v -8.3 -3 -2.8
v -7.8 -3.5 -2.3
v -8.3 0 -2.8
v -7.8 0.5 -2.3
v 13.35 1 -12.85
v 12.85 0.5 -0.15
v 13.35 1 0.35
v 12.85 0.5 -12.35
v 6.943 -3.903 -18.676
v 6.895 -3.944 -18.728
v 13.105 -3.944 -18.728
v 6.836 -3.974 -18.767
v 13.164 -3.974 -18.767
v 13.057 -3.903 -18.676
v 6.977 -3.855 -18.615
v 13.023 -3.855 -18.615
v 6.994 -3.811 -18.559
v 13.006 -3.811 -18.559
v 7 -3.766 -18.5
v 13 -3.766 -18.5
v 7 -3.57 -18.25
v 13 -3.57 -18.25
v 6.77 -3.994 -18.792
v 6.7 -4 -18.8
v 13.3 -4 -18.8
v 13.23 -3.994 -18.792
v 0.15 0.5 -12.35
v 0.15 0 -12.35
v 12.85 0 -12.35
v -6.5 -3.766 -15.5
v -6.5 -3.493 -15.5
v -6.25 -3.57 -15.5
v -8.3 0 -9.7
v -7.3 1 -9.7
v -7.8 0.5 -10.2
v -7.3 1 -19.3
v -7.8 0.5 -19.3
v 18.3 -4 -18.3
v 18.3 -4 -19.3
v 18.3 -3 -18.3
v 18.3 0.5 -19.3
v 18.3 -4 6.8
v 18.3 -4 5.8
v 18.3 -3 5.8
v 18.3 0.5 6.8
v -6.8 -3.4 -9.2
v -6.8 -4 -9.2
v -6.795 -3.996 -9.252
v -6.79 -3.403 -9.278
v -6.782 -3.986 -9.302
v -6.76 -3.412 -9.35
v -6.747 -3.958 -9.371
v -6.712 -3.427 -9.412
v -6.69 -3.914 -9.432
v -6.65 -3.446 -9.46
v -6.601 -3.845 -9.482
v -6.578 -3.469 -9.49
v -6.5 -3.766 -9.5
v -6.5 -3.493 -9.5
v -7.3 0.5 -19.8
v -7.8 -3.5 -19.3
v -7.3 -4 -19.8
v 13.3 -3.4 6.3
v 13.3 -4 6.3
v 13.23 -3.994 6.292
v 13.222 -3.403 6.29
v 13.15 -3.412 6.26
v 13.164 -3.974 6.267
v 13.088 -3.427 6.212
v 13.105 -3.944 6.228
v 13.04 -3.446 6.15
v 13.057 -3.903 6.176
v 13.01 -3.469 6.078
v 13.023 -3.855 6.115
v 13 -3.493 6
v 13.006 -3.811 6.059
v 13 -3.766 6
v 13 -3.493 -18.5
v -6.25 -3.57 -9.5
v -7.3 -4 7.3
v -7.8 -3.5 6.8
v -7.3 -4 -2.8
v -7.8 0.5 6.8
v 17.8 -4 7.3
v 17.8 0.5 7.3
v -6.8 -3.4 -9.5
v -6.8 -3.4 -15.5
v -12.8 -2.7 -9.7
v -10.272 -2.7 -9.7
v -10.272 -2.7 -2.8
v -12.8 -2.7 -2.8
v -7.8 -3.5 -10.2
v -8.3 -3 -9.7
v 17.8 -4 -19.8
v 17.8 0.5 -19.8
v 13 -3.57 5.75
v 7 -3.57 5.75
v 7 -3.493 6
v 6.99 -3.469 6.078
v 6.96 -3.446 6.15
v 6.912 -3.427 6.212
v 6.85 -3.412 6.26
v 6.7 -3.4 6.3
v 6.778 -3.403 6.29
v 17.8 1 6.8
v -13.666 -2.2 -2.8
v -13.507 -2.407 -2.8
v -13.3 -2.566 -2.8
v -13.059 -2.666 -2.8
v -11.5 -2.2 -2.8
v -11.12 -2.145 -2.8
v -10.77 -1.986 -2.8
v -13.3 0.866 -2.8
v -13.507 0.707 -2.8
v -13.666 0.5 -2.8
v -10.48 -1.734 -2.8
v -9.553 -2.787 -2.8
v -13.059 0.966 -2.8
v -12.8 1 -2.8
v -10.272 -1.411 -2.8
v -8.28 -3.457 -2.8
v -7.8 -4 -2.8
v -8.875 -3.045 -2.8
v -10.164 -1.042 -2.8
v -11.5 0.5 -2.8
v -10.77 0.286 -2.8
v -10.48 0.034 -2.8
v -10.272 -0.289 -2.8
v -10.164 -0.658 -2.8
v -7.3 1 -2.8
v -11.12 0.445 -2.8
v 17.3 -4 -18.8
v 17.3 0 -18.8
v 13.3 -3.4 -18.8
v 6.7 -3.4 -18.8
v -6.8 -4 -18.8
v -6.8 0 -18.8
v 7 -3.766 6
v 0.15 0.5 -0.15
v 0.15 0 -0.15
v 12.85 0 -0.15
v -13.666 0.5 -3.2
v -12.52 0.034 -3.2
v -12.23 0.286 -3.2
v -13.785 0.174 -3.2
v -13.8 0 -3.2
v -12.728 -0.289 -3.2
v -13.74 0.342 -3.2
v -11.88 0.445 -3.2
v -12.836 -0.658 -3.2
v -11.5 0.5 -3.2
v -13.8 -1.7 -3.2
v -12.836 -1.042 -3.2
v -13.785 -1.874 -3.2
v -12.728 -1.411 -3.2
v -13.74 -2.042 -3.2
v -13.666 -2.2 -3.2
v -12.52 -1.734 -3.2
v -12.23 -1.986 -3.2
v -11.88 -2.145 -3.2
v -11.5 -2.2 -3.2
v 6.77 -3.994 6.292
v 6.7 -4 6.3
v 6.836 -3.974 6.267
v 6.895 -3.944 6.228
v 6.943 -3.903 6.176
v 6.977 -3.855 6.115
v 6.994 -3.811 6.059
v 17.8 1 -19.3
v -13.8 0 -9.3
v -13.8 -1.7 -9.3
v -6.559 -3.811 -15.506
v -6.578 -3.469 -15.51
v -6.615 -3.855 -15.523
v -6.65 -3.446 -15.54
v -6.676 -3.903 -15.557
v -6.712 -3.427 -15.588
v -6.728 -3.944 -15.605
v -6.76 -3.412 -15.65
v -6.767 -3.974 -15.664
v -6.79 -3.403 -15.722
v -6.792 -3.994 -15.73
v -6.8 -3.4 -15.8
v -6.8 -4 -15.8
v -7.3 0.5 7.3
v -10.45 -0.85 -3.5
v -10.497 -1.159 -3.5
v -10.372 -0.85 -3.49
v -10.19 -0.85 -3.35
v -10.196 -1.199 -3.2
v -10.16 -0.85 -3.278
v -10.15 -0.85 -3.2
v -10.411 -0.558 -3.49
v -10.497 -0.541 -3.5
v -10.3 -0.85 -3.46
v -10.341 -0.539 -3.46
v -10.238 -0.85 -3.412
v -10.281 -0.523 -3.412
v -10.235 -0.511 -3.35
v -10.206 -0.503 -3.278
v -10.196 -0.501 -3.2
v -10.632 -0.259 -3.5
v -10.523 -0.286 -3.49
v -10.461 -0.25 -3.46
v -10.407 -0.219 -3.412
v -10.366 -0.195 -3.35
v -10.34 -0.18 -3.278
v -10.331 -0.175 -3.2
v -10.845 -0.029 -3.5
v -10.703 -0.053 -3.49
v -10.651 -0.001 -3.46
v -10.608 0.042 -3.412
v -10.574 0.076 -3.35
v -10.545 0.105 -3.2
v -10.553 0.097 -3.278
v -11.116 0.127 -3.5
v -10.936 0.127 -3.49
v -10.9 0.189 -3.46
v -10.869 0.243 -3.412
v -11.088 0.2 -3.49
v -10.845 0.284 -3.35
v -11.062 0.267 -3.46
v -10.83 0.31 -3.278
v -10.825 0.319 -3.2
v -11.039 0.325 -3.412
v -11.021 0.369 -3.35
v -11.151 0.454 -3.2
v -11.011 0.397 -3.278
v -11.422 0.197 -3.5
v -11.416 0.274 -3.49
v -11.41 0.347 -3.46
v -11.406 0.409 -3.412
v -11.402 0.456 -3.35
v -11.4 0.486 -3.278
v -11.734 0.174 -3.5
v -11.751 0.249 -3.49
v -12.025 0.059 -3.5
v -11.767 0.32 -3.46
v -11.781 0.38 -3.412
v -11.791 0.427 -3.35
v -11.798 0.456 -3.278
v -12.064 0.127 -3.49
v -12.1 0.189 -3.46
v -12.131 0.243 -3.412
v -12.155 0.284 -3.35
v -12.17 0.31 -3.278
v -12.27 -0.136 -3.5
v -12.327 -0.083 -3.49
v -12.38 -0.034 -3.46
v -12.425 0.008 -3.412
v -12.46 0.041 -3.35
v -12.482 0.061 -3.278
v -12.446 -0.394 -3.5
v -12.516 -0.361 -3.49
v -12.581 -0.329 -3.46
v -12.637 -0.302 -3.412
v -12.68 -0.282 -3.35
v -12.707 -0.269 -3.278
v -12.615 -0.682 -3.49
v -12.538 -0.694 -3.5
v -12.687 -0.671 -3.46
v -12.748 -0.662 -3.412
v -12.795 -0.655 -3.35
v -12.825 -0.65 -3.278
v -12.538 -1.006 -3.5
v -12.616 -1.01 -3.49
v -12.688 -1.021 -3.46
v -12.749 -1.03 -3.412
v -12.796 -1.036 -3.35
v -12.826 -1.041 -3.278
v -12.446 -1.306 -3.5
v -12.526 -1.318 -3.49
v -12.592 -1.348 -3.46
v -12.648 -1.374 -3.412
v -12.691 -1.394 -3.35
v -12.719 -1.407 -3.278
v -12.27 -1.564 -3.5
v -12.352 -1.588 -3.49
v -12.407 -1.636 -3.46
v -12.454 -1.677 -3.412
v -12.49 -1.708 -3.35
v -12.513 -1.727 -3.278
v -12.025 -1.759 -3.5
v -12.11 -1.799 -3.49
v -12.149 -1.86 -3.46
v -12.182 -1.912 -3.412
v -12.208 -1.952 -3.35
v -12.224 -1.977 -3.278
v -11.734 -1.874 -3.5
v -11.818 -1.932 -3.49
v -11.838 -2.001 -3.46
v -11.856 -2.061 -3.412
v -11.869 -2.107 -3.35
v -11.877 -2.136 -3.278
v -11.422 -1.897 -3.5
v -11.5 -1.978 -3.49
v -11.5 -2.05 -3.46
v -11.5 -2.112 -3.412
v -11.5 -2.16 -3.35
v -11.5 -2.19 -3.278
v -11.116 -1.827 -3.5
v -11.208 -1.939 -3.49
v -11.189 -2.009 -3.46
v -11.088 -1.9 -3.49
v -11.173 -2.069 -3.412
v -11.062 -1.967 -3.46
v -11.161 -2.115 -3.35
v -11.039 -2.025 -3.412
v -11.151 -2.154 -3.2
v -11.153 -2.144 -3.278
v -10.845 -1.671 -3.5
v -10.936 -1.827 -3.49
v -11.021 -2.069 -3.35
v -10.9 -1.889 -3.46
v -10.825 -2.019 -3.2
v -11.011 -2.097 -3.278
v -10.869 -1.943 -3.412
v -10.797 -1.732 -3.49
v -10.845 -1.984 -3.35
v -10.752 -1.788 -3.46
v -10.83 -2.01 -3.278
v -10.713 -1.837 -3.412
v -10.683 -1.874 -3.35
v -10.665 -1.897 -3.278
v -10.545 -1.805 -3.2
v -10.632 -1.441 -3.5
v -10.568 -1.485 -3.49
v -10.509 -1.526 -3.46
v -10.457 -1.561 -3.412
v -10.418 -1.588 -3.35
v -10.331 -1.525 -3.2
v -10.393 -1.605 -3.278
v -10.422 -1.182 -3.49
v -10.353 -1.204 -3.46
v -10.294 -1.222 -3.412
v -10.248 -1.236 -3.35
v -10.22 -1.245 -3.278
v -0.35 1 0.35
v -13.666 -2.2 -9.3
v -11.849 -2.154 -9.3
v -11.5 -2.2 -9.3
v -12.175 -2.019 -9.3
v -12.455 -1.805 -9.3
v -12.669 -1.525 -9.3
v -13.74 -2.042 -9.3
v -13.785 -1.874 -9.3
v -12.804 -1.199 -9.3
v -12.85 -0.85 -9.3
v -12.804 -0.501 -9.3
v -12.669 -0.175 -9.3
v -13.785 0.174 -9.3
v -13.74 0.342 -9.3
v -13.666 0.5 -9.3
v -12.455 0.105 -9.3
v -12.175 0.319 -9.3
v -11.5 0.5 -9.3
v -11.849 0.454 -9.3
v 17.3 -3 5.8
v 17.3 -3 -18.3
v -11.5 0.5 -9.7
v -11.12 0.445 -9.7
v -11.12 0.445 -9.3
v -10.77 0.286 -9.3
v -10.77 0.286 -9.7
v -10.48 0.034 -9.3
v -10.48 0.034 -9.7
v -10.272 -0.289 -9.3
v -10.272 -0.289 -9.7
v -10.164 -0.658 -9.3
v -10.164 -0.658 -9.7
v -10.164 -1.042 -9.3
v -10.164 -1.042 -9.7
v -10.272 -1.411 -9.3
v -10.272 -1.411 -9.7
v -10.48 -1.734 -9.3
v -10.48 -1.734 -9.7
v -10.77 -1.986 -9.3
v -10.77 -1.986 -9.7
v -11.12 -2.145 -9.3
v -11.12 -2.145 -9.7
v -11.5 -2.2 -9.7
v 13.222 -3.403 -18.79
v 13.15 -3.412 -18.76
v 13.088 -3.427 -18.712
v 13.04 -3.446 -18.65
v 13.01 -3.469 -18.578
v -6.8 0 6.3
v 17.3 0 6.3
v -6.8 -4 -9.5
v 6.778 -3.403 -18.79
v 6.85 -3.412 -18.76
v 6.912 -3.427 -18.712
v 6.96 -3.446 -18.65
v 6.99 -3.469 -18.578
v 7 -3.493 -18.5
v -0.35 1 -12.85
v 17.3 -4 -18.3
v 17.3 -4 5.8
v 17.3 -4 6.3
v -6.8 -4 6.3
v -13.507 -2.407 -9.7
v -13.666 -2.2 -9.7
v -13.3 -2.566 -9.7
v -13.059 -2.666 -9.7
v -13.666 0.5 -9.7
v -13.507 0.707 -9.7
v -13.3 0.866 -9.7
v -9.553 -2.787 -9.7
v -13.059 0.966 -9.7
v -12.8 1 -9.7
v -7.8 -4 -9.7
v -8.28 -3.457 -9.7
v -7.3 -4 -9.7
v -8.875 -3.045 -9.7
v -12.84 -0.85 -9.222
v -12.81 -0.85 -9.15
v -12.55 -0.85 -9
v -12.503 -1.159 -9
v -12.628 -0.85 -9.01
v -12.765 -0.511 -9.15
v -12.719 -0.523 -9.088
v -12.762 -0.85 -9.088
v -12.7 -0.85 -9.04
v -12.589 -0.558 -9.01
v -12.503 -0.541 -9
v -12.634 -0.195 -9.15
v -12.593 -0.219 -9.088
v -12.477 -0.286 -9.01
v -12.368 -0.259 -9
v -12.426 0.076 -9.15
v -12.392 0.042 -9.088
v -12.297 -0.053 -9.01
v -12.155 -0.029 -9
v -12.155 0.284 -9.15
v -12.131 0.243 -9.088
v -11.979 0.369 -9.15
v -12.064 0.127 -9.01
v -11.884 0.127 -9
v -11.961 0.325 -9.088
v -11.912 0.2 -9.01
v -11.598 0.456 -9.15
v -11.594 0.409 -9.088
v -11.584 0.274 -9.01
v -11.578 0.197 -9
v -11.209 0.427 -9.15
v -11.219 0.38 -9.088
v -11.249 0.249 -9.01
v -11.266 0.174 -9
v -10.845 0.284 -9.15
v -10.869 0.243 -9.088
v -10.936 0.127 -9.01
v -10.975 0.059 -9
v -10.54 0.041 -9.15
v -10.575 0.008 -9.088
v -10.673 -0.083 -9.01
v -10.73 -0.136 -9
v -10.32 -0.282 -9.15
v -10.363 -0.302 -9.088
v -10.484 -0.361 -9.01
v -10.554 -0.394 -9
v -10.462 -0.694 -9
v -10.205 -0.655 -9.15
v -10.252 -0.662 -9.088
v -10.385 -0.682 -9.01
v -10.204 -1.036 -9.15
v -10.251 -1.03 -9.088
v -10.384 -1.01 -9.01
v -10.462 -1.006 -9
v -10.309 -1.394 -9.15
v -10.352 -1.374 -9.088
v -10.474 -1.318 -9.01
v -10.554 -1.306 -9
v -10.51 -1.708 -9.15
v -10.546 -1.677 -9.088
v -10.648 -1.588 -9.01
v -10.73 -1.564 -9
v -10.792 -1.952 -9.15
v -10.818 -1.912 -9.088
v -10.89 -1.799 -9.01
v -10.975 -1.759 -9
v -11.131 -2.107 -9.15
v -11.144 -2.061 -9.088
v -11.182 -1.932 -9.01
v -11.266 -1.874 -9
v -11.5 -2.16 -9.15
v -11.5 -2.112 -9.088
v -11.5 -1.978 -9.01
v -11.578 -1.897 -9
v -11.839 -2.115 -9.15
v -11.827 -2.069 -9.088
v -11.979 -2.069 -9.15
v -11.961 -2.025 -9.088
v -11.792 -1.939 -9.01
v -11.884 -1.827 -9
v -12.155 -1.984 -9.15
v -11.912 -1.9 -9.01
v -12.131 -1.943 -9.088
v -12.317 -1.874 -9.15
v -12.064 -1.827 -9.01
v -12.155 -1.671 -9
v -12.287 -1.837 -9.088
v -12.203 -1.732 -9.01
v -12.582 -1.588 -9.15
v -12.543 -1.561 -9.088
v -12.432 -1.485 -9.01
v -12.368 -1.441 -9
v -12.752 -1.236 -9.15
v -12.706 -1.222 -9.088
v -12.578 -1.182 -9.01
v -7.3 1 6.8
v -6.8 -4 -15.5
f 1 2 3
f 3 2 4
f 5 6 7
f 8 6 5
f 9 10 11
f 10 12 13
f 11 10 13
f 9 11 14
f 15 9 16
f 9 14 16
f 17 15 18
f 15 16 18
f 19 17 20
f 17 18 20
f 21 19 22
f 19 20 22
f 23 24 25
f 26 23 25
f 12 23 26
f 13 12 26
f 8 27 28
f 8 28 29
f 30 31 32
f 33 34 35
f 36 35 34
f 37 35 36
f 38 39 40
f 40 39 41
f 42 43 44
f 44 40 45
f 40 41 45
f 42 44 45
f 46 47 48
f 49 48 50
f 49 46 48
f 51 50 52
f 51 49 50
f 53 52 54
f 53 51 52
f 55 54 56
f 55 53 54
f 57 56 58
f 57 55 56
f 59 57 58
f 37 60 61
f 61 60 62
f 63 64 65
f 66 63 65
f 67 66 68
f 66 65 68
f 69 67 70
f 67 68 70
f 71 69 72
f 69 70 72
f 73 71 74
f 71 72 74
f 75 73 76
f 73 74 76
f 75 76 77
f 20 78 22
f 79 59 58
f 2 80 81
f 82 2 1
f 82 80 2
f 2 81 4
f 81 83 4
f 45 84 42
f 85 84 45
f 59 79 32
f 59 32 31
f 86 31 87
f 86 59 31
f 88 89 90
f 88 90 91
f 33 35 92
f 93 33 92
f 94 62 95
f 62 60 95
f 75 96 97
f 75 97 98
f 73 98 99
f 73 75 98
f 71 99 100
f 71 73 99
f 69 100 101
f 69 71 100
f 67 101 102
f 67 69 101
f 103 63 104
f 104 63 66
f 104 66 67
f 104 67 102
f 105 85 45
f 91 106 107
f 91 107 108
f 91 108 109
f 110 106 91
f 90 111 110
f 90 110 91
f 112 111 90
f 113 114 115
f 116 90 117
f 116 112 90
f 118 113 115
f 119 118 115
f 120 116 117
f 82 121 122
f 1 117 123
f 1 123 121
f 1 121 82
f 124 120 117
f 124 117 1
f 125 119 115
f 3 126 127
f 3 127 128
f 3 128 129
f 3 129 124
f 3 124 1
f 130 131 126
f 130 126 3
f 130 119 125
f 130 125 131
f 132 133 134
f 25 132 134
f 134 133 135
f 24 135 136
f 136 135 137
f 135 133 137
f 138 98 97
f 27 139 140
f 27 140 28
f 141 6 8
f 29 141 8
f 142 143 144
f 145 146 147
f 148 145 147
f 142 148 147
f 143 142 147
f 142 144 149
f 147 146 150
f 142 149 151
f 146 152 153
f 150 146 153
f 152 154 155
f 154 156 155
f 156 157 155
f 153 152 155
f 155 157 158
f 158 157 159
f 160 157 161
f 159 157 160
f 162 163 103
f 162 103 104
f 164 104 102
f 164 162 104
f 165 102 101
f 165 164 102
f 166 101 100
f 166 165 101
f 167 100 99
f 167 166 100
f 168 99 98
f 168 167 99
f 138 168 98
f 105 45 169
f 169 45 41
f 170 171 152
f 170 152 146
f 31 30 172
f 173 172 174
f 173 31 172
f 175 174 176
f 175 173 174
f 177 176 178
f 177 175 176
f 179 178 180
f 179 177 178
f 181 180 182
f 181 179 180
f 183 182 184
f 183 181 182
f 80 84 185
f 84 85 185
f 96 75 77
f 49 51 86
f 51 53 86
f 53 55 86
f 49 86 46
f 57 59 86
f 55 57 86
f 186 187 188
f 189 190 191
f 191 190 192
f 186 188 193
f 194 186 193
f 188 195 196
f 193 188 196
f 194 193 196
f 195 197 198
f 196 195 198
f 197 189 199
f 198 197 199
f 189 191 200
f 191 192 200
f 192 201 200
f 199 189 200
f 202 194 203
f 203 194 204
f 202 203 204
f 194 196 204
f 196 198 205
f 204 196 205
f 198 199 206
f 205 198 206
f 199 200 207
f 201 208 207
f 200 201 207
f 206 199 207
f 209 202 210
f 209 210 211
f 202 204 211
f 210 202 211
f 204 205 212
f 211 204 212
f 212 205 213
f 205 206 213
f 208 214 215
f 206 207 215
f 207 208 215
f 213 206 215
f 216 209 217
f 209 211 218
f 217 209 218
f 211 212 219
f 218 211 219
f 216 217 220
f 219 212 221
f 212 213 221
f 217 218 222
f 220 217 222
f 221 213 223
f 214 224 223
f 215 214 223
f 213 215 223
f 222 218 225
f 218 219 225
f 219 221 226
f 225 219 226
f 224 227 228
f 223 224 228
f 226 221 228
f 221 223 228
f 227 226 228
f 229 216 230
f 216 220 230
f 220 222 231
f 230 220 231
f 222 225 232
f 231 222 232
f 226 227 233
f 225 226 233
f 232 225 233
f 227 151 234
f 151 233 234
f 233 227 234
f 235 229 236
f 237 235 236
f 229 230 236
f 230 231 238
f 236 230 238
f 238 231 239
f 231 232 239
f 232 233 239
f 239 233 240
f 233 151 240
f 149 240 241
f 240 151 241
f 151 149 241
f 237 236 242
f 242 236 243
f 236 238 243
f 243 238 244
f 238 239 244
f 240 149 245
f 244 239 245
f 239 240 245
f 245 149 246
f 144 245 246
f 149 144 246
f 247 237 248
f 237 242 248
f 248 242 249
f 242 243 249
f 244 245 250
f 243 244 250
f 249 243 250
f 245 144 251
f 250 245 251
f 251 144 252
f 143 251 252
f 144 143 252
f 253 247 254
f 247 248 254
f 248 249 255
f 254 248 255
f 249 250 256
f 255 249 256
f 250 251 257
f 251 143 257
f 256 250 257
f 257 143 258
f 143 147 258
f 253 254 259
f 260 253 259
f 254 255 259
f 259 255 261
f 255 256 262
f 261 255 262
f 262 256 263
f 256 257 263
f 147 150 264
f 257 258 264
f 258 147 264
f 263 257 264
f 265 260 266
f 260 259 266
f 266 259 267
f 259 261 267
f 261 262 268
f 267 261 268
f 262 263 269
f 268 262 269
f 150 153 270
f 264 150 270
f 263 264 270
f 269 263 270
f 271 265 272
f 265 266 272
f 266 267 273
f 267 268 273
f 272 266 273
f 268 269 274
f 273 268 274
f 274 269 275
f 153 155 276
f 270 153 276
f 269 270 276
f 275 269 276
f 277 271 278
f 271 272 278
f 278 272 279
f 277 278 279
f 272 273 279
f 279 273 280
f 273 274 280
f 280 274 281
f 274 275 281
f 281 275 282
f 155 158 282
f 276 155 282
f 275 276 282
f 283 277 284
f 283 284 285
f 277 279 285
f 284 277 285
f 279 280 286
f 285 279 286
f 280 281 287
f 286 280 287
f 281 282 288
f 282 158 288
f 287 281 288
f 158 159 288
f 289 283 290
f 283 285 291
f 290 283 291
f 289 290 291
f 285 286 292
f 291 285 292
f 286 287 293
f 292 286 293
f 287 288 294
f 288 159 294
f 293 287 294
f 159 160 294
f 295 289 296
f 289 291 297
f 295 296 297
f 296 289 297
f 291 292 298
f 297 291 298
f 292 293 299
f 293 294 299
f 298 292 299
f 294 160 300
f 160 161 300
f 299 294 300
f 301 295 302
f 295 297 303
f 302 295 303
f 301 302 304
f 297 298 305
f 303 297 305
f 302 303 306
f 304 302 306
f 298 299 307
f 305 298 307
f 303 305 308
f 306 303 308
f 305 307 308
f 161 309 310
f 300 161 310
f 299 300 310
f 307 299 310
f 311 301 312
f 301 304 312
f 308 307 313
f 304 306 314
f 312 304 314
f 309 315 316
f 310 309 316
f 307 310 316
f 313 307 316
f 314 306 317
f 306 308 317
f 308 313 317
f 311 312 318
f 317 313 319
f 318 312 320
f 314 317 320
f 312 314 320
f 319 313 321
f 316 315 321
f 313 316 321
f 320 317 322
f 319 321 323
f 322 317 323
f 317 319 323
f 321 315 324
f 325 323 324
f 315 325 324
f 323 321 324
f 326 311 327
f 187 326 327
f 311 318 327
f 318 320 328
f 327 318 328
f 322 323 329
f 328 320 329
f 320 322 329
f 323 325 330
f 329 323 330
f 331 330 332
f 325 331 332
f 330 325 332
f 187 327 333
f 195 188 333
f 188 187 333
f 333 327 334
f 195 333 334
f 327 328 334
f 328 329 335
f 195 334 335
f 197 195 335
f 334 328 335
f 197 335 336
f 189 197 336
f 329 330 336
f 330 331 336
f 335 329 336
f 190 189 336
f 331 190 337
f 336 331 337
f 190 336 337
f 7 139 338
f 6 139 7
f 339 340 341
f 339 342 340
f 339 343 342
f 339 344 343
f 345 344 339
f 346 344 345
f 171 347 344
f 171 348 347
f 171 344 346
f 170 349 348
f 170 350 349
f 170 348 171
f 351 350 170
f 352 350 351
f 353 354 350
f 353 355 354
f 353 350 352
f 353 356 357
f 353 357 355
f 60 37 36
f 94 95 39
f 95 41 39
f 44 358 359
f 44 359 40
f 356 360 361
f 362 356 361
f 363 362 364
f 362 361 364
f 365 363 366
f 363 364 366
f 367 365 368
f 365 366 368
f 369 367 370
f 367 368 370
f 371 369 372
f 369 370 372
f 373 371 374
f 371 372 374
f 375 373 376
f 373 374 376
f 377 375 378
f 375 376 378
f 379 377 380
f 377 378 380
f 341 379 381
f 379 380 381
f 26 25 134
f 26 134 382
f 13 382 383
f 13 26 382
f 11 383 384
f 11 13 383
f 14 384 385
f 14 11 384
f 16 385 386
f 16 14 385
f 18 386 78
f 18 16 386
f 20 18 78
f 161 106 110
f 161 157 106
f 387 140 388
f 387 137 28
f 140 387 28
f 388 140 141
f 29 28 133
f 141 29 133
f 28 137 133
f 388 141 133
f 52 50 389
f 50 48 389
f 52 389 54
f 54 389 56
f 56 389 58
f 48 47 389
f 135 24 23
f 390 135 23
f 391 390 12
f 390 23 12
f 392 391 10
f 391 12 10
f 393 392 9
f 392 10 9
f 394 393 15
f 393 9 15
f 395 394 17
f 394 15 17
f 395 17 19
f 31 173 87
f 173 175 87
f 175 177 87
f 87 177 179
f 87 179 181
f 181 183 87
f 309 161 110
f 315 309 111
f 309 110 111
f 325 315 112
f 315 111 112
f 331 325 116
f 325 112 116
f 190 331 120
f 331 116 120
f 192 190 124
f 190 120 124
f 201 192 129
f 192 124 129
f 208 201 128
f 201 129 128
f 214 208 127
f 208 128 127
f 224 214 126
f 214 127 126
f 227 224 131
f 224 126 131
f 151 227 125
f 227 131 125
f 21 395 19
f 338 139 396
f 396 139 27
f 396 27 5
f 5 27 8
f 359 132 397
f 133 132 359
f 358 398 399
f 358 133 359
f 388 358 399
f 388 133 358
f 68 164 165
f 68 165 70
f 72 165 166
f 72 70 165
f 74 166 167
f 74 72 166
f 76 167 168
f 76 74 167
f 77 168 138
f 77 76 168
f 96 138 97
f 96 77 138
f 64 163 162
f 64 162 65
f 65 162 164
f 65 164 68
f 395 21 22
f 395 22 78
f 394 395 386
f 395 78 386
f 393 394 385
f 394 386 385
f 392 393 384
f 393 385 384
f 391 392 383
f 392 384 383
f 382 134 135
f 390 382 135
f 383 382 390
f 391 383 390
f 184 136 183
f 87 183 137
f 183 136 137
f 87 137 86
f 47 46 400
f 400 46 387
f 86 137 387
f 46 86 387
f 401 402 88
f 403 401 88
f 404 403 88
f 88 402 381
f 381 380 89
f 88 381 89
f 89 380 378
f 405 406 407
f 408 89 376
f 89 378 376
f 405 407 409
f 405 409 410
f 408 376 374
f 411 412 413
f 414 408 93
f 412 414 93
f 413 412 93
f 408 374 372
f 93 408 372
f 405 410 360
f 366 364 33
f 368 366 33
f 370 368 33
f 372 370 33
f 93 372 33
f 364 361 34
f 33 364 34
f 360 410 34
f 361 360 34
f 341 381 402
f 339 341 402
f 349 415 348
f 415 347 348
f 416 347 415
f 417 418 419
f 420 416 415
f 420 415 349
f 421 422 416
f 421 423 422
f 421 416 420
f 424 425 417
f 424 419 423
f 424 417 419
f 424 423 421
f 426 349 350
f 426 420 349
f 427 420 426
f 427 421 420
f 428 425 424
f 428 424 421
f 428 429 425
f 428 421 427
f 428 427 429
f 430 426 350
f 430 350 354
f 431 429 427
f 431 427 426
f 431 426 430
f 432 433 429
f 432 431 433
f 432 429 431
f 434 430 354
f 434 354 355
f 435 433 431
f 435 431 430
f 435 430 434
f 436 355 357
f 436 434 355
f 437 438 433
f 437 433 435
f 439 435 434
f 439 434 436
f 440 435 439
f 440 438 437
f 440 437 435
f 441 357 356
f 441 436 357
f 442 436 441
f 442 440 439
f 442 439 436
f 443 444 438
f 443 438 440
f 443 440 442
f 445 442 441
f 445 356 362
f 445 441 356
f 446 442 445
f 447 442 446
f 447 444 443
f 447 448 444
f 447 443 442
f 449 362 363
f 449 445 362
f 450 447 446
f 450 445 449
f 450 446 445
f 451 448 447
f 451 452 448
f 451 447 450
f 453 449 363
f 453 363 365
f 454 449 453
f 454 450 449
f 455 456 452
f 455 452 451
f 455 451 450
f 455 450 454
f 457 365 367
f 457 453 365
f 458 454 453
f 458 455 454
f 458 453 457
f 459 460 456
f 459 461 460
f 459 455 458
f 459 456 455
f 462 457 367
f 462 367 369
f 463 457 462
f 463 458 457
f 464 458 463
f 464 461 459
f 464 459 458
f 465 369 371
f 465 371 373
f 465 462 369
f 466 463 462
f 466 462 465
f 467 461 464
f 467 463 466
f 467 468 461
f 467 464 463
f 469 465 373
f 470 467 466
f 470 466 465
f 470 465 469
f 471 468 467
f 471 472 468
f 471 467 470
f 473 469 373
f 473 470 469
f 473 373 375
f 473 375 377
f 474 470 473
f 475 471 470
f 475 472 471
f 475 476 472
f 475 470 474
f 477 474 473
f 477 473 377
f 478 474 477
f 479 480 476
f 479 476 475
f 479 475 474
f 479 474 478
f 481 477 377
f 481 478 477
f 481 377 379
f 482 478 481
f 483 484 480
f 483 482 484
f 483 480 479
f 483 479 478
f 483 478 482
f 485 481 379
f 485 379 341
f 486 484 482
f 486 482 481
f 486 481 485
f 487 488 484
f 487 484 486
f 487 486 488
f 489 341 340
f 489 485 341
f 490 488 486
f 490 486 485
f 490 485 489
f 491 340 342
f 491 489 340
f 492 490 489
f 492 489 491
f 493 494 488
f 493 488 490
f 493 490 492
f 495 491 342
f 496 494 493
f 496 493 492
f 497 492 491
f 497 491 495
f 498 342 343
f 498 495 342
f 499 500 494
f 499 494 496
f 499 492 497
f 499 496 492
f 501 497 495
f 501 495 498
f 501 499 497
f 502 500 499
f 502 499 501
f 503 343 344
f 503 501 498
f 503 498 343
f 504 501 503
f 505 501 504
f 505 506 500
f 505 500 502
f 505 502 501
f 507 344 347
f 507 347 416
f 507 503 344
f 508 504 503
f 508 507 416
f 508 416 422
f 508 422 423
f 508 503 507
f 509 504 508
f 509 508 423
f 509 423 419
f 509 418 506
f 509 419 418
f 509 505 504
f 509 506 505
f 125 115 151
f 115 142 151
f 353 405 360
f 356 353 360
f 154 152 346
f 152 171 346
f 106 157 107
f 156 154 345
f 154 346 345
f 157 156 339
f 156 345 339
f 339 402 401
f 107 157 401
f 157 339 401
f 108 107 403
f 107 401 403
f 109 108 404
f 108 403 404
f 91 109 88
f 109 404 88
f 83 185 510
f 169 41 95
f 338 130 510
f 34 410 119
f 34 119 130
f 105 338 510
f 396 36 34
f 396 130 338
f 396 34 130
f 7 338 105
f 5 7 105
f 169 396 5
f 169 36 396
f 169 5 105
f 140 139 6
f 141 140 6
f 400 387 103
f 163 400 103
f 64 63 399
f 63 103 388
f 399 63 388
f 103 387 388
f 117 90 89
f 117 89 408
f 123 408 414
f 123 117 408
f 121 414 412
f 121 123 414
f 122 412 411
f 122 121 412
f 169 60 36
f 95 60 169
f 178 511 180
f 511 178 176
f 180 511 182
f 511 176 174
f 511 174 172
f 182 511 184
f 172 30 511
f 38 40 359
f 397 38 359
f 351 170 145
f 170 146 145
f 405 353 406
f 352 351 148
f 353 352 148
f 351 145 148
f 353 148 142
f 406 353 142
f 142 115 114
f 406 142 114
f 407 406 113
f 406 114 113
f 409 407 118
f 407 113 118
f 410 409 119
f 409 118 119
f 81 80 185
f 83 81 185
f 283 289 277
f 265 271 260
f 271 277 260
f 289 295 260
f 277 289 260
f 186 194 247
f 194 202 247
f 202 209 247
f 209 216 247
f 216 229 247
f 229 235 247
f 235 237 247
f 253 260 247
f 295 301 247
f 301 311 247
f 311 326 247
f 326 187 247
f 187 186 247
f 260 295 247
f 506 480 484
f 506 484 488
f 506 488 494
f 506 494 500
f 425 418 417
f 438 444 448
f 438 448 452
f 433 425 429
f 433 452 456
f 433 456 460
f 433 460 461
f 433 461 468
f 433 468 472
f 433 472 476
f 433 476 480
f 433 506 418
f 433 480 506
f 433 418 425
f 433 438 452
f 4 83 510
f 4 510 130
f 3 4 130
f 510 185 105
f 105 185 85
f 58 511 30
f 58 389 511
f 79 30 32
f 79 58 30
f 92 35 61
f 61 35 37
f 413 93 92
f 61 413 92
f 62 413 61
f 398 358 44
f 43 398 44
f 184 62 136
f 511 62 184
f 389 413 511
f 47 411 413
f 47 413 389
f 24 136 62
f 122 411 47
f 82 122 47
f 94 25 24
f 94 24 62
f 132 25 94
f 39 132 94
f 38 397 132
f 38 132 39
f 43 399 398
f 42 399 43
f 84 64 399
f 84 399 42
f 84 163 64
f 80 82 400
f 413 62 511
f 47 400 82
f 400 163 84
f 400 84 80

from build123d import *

# Parameters (mm, degrees)
SKETCH1_W            = 26.1
SKETCH1_H            = 27.1
SKETCH1_W_2          = 13
SKETCH1_H_2          = 12.5
BOSS_EXTRUDE1_DEPTH  = 1
BOSS_EXTRUDE2_DEPTH  = 4
SKETCH3_W            = 1
SKETCH3_H            = 24.1
BOSS_EXTRUDE3_DEPTH  = 3
BOSS_EXTRUDE4_DEPTH  = 3
FILLET1_R            = 0.3
BOSS_EXTRUDE5_DEPTH  = 6
FILLET2_R            = 0.3
FILLET2_OF_MIRROR2_R = 0.3
SKETCH8_W            = 13
SKETCH8_H            = 12.5
SKETCH8_W_2          = 12.7
SKETCH8_H_2          = 12.2
BOSS_EXTRUDE6_DEPTH  = 1
SKETCH14_W           = 6
SKETCH14_H           = 3.7
BOSS_EXTRUDE8_DEPTH  = 3.45
SKETCH15_R           = 1.35
CUT_EXTRUDE4_DEPTH   = 0.7
FILLET6_R            = 0.3
CUT_EXTRUDE5_DEPTH   = 0.4
FILLET7_R            = 3
MIRROR4_START        = -2.2
MIRROR4_2_OUTLINE_W  = 2.3
MIRROR4_2_OUTLINE_H  = 0.4
MIRROR4_2_DEPTH      = 2.7
FILLET8_R            = 1
CHAMFER1_SIZE        = 0.5
CHAMFER2_SIZE        = 0.5


with BuildPart() as part:
    # Sketch1 → Boss-Extrude1 (new body)
    with BuildSketch(Plane(origin=(0, 0, 0), x_dir=(1, 0, 0), z_dir=(0, 1, 0))):
        with Locations((5.25, 6.25)):
            Rectangle(SKETCH1_W, SKETCH1_H)
        with Locations((6.5, 6.25)):
            Rectangle(SKETCH1_W_2, SKETCH1_H_2, mode=Mode.SUBTRACT)
    extrude(amount=BOSS_EXTRUDE1_DEPTH)

    # Sketch2 → Boss-Extrude2 (add)
    with BuildSketch(Plane.XZ):
        Polygon((-7.8, 7.3), (-7.8, -19.8), (18.3, -19.8), (18.3, -18.3), (17.3, -18.3), (17.3, -18.8), (-6.8, -18.8), (-6.8, 6.3), (17.3, 6.3), (17.3, 5.8), (18.3, 5.8), (18.3, 7.3), align=None)
    extrude(amount=BOSS_EXTRUDE2_DEPTH)

    # Sketch3 → Boss-Extrude3 (add)
    with BuildSketch(Plane.XZ):
        with Locations((17.8, -6.25)):
            Rectangle(SKETCH3_W, SKETCH3_H)
    extrude(amount=BOSS_EXTRUDE3_DEPTH)

    # Sketch4 → Boss-Extrude4 (add, symmetric)
    with BuildSketch(Plane.XY.offset(-12.5)):
        Polygon((-6.8, -4), (-6.25, -3.570292905), (-6.8, -3.4), align=None)
    extrude(amount=BOSS_EXTRUDE4_DEPTH, both=True)

    # Fillet1
    # the kernel refuses this fillet: 0.3 mm, written as the material it adds along each edge
    with BuildSketch(Plane(origin=(-6.8, -2.65, -15.5), x_dir=(0, 0, -1), z_dir=(0, -1, 0))) as fillet1_piece_1_section:
        with BuildLine():
            CenterArc((FILLET1_R, FILLET1_R), FILLET1_R, 180, 90)
            Line((0, FILLET1_R), (0, 0))
            Line((0, 0), (FILLET1_R, 0))
        make_face()
    fillet1_piece_1 = extrude(amount=1.35, mode=Mode.PRIVATE)
    fillet1_piece_1 = split(fillet1_piece_1, bisect_by=Plane(origin=(-7.011903145, -3.334389814, -15.5), z_dir=(-0.2957706001702403, -0.9552589973797346, 0)), keep=Keep.TOP, mode=Mode.PRIVATE)
    fillet1_piece_1 = split(fillet1_piece_1, bisect_by=Plane(origin=(-6.145050385, -3.48829728, -15.5), z_dir=(-0.6156614753256621, 0.7880107536067191, 0)), keep=Keep.TOP, mode=Mode.PRIVATE)
    add(fillet1_piece_1)
    with BuildSketch(Plane(origin=(-6.8, -2.65, -9.5), x_dir=(0, 0, 1), z_dir=(0, -1, 0))) as fillet1_piece_2_section:
        with BuildLine():
            CenterArc((FILLET1_R, -FILLET1_R), FILLET1_R, 90, 90)
            Line((0, -FILLET1_R), (0, 0))
            Line((0, 0), (FILLET1_R, 0))
        make_face()
    fillet1_piece_2 = extrude(amount=1.35, mode=Mode.PRIVATE)
    fillet1_piece_2 = split(fillet1_piece_2, bisect_by=Plane(origin=(-7.011903145, -3.334389814, -9.5), z_dir=(-0.2957706001702403, -0.9552589973797346, 0)), keep=Keep.TOP, mode=Mode.PRIVATE)
    fillet1_piece_2 = split(fillet1_piece_2, bisect_by=Plane(origin=(-6.145050385, -3.48829728, -9.5), z_dir=(-0.6156614753256621, 0.7880107536067191, 0)), keep=Keep.TOP, mode=Mode.PRIVATE)
    add(fillet1_piece_2)

    # Sketch6 → Boss-Extrude5 (add)
    with BuildSketch(Plane.ZY.offset(-13)):
        Polygon((-18.8, -4), (-18.25, -3.570292905), (-18.8, -3.4), align=None)
    boss_extrude5 = extrude(amount=BOSS_EXTRUDE5_DEPTH)

    # Fillet2
    fillet2_edges = [part.edges().sort_by_distance(p)[0] for p in [
        (13, -3.7, -18.8),
        (7, -3.7, -18.8),
    ]]
    fillet(fillet2_edges, radius=FILLET2_R)

    # Mirror2: Boss-Extrude5 across plane
    add(boss_extrude5.mirror(Plane(origin=(0, 0, -6.25), x_dir=(1, 0, 0), z_dir=(0, 0, -1))))

    # Fillet2 of Mirror2
    fillet2_of_mirror2_edges = [part.edges().sort_by_distance(p)[0] for p in [
        (13, -3.7, 6.3),
        (7, -3.7, 6.3),
    ]]
    fillet(fillet2_of_mirror2_edges, radius=FILLET2_OF_MIRROR2_R)

    # Sketch8 → Boss-Extrude6 (add)
    with BuildSketch(Plane(origin=(0, 1, 0), x_dir=(1, 0, 0), z_dir=(0, 1, 0))):
        with Locations((6.5, 6.25)):
            Rectangle(SKETCH8_W, SKETCH8_H)
        with Locations((6.5, 6.25)):
            Rectangle(SKETCH8_W_2, SKETCH8_H_2, mode=Mode.SUBTRACT)
    extrude(amount=-BOSS_EXTRUDE6_DEPTH)

    # Sketch14 → Boss-Extrude8 (add, symmetric)
    with BuildSketch(Plane(origin=(0, 0, -6.25), x_dir=(-1, 0, 0), z_dir=(0, 0, -1))):
        with Locations((10.8, -0.85)):
            Rectangle(SKETCH14_W, SKETCH14_H)
    extrude(amount=BOSS_EXTRUDE8_DEPTH, both=True)

    # Sketch15 → Cut-Extrude4 (cut)
    with BuildSketch(Plane(origin=(0, 0, -9.7), x_dir=(-1, 0, 0), z_dir=(0, 0, -1))):
        with Locations((11.5, -0.85)):
            Circle(SKETCH15_R)
    extrude(amount=-CUT_EXTRUDE4_DEPTH, mode=Mode.SUBTRACT)

    # Fillet6
    fillet6_edges = [part.edges().sort_by_distance(p)[0] for p in [
        (-10.15, -0.85, -9),
    ]]
    fillet(fillet6_edges, radius=FILLET6_R)

    # Sketch16 → Cut-Extrude5 (cut)
    with BuildSketch(Plane(origin=(0, 0, -9.7), x_dir=(-1, 0, 0), z_dir=(0, 0, -1))):
        with BuildLine():
            Line((13.8, 0.5), (11.5, 0.5))
            ThreePointArc((11.5, 0.5), (12.454594155, 0.104594155), (12.85, -0.85))
            ThreePointArc((12.85, -0.85), (12.454594155, -1.804594155), (11.5, -2.2))
            Line((11.5, -2.2), (13.8, -2.2))
            Line((13.8, -2.2), (13.8, 0.5))
        make_face()
    extrude(amount=-CUT_EXTRUDE5_DEPTH, mode=Mode.SUBTRACT)

    # Fillet7
    # the kernel refuses this fillet: 3 mm, written as the material it adds along each edge
    with BuildSketch(Plane(origin=(-7.8, -2.7, -2.8), x_dir=(-1, 0, 0), z_dir=(0, 0, -1))) as fillet7_piece_1:
        with BuildLine():
            CenterArc((2.471841419, -3), FILLET7_R, 90, 55.481892159)
            Line((0, -1.3), (-0.049436828, -1.266))
            ThreePointArc((-0.049436828, -1.266), (-0.06, -0.65), (-0.06, 0))
            Line((-0.06, 0), (0, 0.06))
            Line((0, 0.06), (2.471841419, 0.06))
            Line((2.471841419, 0.06), (2.471841419, 0))
        make_face()
    extrude(amount=6.9)

    # Mirror4: read off the stored shape, not the designer's step
    # Mirror4 outline → Mirror4 (revolve, cut)
    with BuildSketch(Plane(origin=(-11.5, -0.85, 0), x_dir=(1, 0, 0), z_dir=(0, -1, 0))):
        with BuildLine():
            Line((0, -2.8), (0, -3.5))
            Line((0, -3.5), (1.05, -3.5))
            ThreePointArc((1.05, -3.5), (1.262132034, -3.412132034), (1.35, -3.2))
            Line((1.35, -3.2), (1.35, -2.8))
            Line((1.35, -2.8), (0, -2.8))
        make_face()
    revolve(axis=Axis((-11.5, -0.85, 0), (0, 0, 1)), mode=Mode.SUBTRACT)

    # Mirror4 2 outline → Mirror4 2 (cut)
    with BuildSketch(Plane(origin=(0, 0, 0), x_dir=(1, 0, 0), z_dir=(0, 1, 0)).offset(MIRROR4_START)):
        with Locations((-12.65, 3)):
            Rectangle(MIRROR4_2_OUTLINE_W, MIRROR4_2_OUTLINE_H)
    extrude(amount=MIRROR4_2_DEPTH, mode=Mode.SUBTRACT)

    # Fillet8
    fillet8_edges = [part.edges().sort_by_distance(p)[0] for p in [
        (-13.8, 1, -6.25),
        (-13.8, -2.7, -6.25),
    ]]
    fillet(fillet8_edges, radius=FILLET8_R)

    # Chamfer1
    chamfer1_edges = [part.edges().sort_by_distance(p)[0] for p in [
        (-7.8, 1, -14.75),
        (5.25, 1, 7.3),
        (18.3, -1.5, -19.8),
        (18.3, -1.5, 7.3),
        (-7.8, -1.5, 7.3),
        (-7.8, -1.5, -19.8),
        (6.5, 1, -0.15),
        (12.85, 1, -6.25),
        (6.5, 1, -12.35),
        (0.15, 1, -6.25),
        (18.3, 1, -6.25),
        (-7.8, 1, 2.25),
        (-7.8, -4, -14.75),
        (-7.8, -4, 2.25),
        (5.25, 1, -19.8),
    ]]
    chamfer(chamfer1_edges, length=CHAMFER1_SIZE)

    # Chamfer2
    chamfer2_edges = [part.edges().sort_by_distance(p)[0] for p in [
        (-7.8, -1.5, -2.8),
        (-7.8, -1.5, -9.7),
    ]]
    chamfer(chamfer2_edges, length=CHAMFER2_SIZE)


solid = part.part
